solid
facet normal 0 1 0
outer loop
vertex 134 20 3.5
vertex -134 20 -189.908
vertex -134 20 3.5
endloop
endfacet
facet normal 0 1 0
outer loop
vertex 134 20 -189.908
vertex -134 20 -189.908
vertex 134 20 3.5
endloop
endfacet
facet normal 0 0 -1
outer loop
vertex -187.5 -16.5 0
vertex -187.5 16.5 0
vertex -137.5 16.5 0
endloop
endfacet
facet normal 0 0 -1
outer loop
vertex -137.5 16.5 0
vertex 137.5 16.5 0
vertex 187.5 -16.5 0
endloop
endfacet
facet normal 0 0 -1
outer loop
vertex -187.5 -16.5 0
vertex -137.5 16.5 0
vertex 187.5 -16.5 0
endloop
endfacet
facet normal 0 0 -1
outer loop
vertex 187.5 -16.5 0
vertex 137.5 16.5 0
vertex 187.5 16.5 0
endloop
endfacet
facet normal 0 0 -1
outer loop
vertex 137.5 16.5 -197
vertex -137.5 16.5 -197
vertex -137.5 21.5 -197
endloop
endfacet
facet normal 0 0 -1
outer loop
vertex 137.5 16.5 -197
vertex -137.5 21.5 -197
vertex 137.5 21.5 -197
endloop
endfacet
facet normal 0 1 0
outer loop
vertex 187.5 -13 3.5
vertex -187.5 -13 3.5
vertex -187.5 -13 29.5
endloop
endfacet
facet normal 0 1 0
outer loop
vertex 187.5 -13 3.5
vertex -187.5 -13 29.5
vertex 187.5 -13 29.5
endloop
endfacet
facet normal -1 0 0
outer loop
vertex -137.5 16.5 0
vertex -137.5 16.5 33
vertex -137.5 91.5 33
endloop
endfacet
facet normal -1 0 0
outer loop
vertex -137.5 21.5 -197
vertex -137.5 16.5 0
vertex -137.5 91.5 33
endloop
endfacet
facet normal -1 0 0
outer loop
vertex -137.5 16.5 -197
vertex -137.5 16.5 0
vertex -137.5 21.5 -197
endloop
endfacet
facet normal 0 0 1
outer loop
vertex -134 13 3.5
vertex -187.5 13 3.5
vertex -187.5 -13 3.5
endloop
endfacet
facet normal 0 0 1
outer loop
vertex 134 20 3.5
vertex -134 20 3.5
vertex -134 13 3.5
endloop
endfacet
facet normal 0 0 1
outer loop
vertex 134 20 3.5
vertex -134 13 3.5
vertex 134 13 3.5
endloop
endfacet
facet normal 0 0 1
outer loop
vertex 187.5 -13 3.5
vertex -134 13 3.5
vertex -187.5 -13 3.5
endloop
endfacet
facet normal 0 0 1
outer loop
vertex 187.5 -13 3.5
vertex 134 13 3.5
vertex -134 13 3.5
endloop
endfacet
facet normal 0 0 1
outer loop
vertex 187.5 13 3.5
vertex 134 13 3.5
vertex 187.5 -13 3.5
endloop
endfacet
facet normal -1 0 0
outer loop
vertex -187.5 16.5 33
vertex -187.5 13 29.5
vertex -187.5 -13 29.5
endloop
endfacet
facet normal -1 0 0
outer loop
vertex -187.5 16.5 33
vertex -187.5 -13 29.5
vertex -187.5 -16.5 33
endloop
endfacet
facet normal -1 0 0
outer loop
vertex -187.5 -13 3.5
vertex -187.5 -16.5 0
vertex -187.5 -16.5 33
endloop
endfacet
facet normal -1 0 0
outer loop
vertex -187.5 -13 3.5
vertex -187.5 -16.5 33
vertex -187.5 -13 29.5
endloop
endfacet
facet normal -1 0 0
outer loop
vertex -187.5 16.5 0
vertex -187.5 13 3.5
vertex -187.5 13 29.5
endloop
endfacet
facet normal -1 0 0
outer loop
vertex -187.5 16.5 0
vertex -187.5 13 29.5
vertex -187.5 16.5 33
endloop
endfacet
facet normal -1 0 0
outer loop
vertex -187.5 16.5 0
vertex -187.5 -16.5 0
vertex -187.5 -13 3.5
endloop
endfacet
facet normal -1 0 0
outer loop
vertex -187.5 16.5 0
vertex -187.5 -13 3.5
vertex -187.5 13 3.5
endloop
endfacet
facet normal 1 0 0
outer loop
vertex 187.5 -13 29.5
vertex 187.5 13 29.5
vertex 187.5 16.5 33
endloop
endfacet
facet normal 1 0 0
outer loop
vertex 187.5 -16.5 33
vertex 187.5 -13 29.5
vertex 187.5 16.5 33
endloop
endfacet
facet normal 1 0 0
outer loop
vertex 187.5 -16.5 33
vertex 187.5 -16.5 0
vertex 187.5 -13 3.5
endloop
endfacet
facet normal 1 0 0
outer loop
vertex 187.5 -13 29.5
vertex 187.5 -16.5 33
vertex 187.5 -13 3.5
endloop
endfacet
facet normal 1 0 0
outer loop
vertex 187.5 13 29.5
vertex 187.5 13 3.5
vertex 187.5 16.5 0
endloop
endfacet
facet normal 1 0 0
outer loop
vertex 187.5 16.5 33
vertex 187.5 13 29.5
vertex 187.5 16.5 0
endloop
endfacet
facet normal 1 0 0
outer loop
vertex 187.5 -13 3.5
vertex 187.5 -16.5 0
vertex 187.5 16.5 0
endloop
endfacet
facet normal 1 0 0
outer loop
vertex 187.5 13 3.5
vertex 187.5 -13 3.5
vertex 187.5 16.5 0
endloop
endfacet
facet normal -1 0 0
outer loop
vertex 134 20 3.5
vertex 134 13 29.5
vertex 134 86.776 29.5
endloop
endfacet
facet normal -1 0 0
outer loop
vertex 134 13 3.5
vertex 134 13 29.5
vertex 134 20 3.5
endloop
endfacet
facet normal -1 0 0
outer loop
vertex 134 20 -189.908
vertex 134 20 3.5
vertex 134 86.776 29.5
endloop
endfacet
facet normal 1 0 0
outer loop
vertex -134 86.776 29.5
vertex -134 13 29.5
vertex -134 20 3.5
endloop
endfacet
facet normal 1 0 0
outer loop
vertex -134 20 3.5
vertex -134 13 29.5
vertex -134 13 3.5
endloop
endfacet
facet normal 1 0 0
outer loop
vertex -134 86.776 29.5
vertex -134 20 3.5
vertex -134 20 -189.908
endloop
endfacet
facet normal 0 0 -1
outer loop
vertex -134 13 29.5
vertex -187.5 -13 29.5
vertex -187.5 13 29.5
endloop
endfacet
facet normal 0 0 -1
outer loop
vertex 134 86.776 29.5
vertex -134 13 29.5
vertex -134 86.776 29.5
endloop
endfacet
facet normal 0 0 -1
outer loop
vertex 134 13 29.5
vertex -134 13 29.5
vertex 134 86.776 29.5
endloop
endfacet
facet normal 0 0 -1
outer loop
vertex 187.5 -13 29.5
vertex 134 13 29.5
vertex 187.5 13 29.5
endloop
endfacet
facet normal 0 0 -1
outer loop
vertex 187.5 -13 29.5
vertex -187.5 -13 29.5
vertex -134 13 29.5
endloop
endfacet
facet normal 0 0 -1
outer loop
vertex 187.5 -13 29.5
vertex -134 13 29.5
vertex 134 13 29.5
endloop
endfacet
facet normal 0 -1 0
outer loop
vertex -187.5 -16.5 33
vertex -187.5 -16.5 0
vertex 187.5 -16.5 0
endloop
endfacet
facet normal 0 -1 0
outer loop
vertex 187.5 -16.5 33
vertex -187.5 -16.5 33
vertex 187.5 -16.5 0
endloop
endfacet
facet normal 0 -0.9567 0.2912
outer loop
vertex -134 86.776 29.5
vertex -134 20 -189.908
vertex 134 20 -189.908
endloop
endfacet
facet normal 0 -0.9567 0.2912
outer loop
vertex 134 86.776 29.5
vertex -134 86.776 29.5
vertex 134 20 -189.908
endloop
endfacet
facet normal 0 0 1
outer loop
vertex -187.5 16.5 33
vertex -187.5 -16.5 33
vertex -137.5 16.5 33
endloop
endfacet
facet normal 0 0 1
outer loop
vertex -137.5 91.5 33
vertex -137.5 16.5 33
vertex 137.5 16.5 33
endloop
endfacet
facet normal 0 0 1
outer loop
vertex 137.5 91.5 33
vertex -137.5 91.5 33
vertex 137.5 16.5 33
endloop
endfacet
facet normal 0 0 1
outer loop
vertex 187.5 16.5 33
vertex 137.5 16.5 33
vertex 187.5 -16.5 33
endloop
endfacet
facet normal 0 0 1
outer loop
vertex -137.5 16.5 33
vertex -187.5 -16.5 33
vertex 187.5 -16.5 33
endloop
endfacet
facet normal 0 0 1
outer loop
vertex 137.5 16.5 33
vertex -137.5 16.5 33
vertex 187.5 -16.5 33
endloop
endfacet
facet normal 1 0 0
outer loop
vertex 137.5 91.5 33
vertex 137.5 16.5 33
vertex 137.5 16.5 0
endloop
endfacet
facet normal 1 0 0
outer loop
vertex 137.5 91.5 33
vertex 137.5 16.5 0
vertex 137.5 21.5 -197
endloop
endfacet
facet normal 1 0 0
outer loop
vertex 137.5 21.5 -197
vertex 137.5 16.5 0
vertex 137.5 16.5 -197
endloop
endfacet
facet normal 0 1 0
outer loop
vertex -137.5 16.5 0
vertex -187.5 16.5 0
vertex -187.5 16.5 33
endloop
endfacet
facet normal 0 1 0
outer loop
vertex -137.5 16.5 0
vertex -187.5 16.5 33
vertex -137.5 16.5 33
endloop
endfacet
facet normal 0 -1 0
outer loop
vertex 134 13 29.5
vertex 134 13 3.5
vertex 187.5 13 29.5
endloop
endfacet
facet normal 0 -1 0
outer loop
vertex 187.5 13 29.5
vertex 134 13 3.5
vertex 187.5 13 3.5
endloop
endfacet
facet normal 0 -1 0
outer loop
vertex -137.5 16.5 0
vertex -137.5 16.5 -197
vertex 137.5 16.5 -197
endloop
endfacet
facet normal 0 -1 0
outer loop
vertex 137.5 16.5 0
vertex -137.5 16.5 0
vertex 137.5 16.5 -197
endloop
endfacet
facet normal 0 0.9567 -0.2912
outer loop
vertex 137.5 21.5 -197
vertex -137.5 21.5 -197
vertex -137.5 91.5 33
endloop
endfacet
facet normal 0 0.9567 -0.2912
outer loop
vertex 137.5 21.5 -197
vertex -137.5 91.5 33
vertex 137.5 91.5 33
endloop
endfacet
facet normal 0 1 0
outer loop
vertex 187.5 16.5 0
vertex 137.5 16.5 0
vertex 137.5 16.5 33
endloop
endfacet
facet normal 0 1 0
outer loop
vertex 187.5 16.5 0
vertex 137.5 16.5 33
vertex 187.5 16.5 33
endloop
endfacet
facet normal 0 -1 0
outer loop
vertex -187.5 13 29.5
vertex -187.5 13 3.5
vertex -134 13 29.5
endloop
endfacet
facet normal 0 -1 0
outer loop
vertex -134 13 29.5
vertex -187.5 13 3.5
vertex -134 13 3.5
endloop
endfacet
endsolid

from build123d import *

# Parameters (mm, degrees)
CROQUIS6_W              = 375
CROQUIS6_H              = 33
SALIENTE_EXTRUIR4_DEPTH = 33
CROQUIS7_W              = 275
CROQUIS7_H              = 230
SALIENTE_EXTRUIR5_DEPTH = 75
CHAFL_N2_START          = 77.927326738
CHAFL_N2_OUTLINE_W      = 275
CHAFL_N2_OUTLINE_H      = 245
CHAFL_N2_DEPTH          = 68.072673262
VACIADO4_T              = -3.5


with BuildPart() as part:
    # Croquis6 → Saliente-Extruir4 (new body)
    with BuildSketch(Plane.XY):
        Rectangle(CROQUIS6_W, CROQUIS6_H)
    extrude(amount=SALIENTE_EXTRUIR4_DEPTH)

    # Croquis7 → Saliente-Extruir5 (add)
    with BuildSketch(Plane(origin=(0, 16.5, 0), x_dir=(1, 0, 0), z_dir=(0, 1, 0))):
        with Locations((6.494e-05, 82)):
            Rectangle(CROQUIS7_W, CROQUIS7_H)
    extrude(amount=SALIENTE_EXTRUIR5_DEPTH)

    # Chaflán2: read off the stored shape, not the designer's step
    # Chaflán2 outline → Chaflán2 (cut)
    with BuildSketch(Plane(origin=(0, 0, 0), x_dir=(1, 0, 0), z_dir=(0, 0.9566738804288585, -0.2911616157826961)).offset(CHAFL_N2_START)):
        with Locations((6.494e-05, 62.5)):
            Rectangle(CHAFL_N2_OUTLINE_W, CHAFL_N2_OUTLINE_H)
    extrude(amount=CHAFL_N2_DEPTH, mode=Mode.SUBTRACT)

    # Vaciado4
    vaciado4_openings = [part.faces().sort_by_distance(p)[0] for p in [
        (-187.5, 0, 16.5),
        (187.5, 0, 16.5),
    ]]
    offset(amount=VACIADO4_T, openings=vaciado4_openings, kind=Kind.INTERSECTION)


solid = part.part
